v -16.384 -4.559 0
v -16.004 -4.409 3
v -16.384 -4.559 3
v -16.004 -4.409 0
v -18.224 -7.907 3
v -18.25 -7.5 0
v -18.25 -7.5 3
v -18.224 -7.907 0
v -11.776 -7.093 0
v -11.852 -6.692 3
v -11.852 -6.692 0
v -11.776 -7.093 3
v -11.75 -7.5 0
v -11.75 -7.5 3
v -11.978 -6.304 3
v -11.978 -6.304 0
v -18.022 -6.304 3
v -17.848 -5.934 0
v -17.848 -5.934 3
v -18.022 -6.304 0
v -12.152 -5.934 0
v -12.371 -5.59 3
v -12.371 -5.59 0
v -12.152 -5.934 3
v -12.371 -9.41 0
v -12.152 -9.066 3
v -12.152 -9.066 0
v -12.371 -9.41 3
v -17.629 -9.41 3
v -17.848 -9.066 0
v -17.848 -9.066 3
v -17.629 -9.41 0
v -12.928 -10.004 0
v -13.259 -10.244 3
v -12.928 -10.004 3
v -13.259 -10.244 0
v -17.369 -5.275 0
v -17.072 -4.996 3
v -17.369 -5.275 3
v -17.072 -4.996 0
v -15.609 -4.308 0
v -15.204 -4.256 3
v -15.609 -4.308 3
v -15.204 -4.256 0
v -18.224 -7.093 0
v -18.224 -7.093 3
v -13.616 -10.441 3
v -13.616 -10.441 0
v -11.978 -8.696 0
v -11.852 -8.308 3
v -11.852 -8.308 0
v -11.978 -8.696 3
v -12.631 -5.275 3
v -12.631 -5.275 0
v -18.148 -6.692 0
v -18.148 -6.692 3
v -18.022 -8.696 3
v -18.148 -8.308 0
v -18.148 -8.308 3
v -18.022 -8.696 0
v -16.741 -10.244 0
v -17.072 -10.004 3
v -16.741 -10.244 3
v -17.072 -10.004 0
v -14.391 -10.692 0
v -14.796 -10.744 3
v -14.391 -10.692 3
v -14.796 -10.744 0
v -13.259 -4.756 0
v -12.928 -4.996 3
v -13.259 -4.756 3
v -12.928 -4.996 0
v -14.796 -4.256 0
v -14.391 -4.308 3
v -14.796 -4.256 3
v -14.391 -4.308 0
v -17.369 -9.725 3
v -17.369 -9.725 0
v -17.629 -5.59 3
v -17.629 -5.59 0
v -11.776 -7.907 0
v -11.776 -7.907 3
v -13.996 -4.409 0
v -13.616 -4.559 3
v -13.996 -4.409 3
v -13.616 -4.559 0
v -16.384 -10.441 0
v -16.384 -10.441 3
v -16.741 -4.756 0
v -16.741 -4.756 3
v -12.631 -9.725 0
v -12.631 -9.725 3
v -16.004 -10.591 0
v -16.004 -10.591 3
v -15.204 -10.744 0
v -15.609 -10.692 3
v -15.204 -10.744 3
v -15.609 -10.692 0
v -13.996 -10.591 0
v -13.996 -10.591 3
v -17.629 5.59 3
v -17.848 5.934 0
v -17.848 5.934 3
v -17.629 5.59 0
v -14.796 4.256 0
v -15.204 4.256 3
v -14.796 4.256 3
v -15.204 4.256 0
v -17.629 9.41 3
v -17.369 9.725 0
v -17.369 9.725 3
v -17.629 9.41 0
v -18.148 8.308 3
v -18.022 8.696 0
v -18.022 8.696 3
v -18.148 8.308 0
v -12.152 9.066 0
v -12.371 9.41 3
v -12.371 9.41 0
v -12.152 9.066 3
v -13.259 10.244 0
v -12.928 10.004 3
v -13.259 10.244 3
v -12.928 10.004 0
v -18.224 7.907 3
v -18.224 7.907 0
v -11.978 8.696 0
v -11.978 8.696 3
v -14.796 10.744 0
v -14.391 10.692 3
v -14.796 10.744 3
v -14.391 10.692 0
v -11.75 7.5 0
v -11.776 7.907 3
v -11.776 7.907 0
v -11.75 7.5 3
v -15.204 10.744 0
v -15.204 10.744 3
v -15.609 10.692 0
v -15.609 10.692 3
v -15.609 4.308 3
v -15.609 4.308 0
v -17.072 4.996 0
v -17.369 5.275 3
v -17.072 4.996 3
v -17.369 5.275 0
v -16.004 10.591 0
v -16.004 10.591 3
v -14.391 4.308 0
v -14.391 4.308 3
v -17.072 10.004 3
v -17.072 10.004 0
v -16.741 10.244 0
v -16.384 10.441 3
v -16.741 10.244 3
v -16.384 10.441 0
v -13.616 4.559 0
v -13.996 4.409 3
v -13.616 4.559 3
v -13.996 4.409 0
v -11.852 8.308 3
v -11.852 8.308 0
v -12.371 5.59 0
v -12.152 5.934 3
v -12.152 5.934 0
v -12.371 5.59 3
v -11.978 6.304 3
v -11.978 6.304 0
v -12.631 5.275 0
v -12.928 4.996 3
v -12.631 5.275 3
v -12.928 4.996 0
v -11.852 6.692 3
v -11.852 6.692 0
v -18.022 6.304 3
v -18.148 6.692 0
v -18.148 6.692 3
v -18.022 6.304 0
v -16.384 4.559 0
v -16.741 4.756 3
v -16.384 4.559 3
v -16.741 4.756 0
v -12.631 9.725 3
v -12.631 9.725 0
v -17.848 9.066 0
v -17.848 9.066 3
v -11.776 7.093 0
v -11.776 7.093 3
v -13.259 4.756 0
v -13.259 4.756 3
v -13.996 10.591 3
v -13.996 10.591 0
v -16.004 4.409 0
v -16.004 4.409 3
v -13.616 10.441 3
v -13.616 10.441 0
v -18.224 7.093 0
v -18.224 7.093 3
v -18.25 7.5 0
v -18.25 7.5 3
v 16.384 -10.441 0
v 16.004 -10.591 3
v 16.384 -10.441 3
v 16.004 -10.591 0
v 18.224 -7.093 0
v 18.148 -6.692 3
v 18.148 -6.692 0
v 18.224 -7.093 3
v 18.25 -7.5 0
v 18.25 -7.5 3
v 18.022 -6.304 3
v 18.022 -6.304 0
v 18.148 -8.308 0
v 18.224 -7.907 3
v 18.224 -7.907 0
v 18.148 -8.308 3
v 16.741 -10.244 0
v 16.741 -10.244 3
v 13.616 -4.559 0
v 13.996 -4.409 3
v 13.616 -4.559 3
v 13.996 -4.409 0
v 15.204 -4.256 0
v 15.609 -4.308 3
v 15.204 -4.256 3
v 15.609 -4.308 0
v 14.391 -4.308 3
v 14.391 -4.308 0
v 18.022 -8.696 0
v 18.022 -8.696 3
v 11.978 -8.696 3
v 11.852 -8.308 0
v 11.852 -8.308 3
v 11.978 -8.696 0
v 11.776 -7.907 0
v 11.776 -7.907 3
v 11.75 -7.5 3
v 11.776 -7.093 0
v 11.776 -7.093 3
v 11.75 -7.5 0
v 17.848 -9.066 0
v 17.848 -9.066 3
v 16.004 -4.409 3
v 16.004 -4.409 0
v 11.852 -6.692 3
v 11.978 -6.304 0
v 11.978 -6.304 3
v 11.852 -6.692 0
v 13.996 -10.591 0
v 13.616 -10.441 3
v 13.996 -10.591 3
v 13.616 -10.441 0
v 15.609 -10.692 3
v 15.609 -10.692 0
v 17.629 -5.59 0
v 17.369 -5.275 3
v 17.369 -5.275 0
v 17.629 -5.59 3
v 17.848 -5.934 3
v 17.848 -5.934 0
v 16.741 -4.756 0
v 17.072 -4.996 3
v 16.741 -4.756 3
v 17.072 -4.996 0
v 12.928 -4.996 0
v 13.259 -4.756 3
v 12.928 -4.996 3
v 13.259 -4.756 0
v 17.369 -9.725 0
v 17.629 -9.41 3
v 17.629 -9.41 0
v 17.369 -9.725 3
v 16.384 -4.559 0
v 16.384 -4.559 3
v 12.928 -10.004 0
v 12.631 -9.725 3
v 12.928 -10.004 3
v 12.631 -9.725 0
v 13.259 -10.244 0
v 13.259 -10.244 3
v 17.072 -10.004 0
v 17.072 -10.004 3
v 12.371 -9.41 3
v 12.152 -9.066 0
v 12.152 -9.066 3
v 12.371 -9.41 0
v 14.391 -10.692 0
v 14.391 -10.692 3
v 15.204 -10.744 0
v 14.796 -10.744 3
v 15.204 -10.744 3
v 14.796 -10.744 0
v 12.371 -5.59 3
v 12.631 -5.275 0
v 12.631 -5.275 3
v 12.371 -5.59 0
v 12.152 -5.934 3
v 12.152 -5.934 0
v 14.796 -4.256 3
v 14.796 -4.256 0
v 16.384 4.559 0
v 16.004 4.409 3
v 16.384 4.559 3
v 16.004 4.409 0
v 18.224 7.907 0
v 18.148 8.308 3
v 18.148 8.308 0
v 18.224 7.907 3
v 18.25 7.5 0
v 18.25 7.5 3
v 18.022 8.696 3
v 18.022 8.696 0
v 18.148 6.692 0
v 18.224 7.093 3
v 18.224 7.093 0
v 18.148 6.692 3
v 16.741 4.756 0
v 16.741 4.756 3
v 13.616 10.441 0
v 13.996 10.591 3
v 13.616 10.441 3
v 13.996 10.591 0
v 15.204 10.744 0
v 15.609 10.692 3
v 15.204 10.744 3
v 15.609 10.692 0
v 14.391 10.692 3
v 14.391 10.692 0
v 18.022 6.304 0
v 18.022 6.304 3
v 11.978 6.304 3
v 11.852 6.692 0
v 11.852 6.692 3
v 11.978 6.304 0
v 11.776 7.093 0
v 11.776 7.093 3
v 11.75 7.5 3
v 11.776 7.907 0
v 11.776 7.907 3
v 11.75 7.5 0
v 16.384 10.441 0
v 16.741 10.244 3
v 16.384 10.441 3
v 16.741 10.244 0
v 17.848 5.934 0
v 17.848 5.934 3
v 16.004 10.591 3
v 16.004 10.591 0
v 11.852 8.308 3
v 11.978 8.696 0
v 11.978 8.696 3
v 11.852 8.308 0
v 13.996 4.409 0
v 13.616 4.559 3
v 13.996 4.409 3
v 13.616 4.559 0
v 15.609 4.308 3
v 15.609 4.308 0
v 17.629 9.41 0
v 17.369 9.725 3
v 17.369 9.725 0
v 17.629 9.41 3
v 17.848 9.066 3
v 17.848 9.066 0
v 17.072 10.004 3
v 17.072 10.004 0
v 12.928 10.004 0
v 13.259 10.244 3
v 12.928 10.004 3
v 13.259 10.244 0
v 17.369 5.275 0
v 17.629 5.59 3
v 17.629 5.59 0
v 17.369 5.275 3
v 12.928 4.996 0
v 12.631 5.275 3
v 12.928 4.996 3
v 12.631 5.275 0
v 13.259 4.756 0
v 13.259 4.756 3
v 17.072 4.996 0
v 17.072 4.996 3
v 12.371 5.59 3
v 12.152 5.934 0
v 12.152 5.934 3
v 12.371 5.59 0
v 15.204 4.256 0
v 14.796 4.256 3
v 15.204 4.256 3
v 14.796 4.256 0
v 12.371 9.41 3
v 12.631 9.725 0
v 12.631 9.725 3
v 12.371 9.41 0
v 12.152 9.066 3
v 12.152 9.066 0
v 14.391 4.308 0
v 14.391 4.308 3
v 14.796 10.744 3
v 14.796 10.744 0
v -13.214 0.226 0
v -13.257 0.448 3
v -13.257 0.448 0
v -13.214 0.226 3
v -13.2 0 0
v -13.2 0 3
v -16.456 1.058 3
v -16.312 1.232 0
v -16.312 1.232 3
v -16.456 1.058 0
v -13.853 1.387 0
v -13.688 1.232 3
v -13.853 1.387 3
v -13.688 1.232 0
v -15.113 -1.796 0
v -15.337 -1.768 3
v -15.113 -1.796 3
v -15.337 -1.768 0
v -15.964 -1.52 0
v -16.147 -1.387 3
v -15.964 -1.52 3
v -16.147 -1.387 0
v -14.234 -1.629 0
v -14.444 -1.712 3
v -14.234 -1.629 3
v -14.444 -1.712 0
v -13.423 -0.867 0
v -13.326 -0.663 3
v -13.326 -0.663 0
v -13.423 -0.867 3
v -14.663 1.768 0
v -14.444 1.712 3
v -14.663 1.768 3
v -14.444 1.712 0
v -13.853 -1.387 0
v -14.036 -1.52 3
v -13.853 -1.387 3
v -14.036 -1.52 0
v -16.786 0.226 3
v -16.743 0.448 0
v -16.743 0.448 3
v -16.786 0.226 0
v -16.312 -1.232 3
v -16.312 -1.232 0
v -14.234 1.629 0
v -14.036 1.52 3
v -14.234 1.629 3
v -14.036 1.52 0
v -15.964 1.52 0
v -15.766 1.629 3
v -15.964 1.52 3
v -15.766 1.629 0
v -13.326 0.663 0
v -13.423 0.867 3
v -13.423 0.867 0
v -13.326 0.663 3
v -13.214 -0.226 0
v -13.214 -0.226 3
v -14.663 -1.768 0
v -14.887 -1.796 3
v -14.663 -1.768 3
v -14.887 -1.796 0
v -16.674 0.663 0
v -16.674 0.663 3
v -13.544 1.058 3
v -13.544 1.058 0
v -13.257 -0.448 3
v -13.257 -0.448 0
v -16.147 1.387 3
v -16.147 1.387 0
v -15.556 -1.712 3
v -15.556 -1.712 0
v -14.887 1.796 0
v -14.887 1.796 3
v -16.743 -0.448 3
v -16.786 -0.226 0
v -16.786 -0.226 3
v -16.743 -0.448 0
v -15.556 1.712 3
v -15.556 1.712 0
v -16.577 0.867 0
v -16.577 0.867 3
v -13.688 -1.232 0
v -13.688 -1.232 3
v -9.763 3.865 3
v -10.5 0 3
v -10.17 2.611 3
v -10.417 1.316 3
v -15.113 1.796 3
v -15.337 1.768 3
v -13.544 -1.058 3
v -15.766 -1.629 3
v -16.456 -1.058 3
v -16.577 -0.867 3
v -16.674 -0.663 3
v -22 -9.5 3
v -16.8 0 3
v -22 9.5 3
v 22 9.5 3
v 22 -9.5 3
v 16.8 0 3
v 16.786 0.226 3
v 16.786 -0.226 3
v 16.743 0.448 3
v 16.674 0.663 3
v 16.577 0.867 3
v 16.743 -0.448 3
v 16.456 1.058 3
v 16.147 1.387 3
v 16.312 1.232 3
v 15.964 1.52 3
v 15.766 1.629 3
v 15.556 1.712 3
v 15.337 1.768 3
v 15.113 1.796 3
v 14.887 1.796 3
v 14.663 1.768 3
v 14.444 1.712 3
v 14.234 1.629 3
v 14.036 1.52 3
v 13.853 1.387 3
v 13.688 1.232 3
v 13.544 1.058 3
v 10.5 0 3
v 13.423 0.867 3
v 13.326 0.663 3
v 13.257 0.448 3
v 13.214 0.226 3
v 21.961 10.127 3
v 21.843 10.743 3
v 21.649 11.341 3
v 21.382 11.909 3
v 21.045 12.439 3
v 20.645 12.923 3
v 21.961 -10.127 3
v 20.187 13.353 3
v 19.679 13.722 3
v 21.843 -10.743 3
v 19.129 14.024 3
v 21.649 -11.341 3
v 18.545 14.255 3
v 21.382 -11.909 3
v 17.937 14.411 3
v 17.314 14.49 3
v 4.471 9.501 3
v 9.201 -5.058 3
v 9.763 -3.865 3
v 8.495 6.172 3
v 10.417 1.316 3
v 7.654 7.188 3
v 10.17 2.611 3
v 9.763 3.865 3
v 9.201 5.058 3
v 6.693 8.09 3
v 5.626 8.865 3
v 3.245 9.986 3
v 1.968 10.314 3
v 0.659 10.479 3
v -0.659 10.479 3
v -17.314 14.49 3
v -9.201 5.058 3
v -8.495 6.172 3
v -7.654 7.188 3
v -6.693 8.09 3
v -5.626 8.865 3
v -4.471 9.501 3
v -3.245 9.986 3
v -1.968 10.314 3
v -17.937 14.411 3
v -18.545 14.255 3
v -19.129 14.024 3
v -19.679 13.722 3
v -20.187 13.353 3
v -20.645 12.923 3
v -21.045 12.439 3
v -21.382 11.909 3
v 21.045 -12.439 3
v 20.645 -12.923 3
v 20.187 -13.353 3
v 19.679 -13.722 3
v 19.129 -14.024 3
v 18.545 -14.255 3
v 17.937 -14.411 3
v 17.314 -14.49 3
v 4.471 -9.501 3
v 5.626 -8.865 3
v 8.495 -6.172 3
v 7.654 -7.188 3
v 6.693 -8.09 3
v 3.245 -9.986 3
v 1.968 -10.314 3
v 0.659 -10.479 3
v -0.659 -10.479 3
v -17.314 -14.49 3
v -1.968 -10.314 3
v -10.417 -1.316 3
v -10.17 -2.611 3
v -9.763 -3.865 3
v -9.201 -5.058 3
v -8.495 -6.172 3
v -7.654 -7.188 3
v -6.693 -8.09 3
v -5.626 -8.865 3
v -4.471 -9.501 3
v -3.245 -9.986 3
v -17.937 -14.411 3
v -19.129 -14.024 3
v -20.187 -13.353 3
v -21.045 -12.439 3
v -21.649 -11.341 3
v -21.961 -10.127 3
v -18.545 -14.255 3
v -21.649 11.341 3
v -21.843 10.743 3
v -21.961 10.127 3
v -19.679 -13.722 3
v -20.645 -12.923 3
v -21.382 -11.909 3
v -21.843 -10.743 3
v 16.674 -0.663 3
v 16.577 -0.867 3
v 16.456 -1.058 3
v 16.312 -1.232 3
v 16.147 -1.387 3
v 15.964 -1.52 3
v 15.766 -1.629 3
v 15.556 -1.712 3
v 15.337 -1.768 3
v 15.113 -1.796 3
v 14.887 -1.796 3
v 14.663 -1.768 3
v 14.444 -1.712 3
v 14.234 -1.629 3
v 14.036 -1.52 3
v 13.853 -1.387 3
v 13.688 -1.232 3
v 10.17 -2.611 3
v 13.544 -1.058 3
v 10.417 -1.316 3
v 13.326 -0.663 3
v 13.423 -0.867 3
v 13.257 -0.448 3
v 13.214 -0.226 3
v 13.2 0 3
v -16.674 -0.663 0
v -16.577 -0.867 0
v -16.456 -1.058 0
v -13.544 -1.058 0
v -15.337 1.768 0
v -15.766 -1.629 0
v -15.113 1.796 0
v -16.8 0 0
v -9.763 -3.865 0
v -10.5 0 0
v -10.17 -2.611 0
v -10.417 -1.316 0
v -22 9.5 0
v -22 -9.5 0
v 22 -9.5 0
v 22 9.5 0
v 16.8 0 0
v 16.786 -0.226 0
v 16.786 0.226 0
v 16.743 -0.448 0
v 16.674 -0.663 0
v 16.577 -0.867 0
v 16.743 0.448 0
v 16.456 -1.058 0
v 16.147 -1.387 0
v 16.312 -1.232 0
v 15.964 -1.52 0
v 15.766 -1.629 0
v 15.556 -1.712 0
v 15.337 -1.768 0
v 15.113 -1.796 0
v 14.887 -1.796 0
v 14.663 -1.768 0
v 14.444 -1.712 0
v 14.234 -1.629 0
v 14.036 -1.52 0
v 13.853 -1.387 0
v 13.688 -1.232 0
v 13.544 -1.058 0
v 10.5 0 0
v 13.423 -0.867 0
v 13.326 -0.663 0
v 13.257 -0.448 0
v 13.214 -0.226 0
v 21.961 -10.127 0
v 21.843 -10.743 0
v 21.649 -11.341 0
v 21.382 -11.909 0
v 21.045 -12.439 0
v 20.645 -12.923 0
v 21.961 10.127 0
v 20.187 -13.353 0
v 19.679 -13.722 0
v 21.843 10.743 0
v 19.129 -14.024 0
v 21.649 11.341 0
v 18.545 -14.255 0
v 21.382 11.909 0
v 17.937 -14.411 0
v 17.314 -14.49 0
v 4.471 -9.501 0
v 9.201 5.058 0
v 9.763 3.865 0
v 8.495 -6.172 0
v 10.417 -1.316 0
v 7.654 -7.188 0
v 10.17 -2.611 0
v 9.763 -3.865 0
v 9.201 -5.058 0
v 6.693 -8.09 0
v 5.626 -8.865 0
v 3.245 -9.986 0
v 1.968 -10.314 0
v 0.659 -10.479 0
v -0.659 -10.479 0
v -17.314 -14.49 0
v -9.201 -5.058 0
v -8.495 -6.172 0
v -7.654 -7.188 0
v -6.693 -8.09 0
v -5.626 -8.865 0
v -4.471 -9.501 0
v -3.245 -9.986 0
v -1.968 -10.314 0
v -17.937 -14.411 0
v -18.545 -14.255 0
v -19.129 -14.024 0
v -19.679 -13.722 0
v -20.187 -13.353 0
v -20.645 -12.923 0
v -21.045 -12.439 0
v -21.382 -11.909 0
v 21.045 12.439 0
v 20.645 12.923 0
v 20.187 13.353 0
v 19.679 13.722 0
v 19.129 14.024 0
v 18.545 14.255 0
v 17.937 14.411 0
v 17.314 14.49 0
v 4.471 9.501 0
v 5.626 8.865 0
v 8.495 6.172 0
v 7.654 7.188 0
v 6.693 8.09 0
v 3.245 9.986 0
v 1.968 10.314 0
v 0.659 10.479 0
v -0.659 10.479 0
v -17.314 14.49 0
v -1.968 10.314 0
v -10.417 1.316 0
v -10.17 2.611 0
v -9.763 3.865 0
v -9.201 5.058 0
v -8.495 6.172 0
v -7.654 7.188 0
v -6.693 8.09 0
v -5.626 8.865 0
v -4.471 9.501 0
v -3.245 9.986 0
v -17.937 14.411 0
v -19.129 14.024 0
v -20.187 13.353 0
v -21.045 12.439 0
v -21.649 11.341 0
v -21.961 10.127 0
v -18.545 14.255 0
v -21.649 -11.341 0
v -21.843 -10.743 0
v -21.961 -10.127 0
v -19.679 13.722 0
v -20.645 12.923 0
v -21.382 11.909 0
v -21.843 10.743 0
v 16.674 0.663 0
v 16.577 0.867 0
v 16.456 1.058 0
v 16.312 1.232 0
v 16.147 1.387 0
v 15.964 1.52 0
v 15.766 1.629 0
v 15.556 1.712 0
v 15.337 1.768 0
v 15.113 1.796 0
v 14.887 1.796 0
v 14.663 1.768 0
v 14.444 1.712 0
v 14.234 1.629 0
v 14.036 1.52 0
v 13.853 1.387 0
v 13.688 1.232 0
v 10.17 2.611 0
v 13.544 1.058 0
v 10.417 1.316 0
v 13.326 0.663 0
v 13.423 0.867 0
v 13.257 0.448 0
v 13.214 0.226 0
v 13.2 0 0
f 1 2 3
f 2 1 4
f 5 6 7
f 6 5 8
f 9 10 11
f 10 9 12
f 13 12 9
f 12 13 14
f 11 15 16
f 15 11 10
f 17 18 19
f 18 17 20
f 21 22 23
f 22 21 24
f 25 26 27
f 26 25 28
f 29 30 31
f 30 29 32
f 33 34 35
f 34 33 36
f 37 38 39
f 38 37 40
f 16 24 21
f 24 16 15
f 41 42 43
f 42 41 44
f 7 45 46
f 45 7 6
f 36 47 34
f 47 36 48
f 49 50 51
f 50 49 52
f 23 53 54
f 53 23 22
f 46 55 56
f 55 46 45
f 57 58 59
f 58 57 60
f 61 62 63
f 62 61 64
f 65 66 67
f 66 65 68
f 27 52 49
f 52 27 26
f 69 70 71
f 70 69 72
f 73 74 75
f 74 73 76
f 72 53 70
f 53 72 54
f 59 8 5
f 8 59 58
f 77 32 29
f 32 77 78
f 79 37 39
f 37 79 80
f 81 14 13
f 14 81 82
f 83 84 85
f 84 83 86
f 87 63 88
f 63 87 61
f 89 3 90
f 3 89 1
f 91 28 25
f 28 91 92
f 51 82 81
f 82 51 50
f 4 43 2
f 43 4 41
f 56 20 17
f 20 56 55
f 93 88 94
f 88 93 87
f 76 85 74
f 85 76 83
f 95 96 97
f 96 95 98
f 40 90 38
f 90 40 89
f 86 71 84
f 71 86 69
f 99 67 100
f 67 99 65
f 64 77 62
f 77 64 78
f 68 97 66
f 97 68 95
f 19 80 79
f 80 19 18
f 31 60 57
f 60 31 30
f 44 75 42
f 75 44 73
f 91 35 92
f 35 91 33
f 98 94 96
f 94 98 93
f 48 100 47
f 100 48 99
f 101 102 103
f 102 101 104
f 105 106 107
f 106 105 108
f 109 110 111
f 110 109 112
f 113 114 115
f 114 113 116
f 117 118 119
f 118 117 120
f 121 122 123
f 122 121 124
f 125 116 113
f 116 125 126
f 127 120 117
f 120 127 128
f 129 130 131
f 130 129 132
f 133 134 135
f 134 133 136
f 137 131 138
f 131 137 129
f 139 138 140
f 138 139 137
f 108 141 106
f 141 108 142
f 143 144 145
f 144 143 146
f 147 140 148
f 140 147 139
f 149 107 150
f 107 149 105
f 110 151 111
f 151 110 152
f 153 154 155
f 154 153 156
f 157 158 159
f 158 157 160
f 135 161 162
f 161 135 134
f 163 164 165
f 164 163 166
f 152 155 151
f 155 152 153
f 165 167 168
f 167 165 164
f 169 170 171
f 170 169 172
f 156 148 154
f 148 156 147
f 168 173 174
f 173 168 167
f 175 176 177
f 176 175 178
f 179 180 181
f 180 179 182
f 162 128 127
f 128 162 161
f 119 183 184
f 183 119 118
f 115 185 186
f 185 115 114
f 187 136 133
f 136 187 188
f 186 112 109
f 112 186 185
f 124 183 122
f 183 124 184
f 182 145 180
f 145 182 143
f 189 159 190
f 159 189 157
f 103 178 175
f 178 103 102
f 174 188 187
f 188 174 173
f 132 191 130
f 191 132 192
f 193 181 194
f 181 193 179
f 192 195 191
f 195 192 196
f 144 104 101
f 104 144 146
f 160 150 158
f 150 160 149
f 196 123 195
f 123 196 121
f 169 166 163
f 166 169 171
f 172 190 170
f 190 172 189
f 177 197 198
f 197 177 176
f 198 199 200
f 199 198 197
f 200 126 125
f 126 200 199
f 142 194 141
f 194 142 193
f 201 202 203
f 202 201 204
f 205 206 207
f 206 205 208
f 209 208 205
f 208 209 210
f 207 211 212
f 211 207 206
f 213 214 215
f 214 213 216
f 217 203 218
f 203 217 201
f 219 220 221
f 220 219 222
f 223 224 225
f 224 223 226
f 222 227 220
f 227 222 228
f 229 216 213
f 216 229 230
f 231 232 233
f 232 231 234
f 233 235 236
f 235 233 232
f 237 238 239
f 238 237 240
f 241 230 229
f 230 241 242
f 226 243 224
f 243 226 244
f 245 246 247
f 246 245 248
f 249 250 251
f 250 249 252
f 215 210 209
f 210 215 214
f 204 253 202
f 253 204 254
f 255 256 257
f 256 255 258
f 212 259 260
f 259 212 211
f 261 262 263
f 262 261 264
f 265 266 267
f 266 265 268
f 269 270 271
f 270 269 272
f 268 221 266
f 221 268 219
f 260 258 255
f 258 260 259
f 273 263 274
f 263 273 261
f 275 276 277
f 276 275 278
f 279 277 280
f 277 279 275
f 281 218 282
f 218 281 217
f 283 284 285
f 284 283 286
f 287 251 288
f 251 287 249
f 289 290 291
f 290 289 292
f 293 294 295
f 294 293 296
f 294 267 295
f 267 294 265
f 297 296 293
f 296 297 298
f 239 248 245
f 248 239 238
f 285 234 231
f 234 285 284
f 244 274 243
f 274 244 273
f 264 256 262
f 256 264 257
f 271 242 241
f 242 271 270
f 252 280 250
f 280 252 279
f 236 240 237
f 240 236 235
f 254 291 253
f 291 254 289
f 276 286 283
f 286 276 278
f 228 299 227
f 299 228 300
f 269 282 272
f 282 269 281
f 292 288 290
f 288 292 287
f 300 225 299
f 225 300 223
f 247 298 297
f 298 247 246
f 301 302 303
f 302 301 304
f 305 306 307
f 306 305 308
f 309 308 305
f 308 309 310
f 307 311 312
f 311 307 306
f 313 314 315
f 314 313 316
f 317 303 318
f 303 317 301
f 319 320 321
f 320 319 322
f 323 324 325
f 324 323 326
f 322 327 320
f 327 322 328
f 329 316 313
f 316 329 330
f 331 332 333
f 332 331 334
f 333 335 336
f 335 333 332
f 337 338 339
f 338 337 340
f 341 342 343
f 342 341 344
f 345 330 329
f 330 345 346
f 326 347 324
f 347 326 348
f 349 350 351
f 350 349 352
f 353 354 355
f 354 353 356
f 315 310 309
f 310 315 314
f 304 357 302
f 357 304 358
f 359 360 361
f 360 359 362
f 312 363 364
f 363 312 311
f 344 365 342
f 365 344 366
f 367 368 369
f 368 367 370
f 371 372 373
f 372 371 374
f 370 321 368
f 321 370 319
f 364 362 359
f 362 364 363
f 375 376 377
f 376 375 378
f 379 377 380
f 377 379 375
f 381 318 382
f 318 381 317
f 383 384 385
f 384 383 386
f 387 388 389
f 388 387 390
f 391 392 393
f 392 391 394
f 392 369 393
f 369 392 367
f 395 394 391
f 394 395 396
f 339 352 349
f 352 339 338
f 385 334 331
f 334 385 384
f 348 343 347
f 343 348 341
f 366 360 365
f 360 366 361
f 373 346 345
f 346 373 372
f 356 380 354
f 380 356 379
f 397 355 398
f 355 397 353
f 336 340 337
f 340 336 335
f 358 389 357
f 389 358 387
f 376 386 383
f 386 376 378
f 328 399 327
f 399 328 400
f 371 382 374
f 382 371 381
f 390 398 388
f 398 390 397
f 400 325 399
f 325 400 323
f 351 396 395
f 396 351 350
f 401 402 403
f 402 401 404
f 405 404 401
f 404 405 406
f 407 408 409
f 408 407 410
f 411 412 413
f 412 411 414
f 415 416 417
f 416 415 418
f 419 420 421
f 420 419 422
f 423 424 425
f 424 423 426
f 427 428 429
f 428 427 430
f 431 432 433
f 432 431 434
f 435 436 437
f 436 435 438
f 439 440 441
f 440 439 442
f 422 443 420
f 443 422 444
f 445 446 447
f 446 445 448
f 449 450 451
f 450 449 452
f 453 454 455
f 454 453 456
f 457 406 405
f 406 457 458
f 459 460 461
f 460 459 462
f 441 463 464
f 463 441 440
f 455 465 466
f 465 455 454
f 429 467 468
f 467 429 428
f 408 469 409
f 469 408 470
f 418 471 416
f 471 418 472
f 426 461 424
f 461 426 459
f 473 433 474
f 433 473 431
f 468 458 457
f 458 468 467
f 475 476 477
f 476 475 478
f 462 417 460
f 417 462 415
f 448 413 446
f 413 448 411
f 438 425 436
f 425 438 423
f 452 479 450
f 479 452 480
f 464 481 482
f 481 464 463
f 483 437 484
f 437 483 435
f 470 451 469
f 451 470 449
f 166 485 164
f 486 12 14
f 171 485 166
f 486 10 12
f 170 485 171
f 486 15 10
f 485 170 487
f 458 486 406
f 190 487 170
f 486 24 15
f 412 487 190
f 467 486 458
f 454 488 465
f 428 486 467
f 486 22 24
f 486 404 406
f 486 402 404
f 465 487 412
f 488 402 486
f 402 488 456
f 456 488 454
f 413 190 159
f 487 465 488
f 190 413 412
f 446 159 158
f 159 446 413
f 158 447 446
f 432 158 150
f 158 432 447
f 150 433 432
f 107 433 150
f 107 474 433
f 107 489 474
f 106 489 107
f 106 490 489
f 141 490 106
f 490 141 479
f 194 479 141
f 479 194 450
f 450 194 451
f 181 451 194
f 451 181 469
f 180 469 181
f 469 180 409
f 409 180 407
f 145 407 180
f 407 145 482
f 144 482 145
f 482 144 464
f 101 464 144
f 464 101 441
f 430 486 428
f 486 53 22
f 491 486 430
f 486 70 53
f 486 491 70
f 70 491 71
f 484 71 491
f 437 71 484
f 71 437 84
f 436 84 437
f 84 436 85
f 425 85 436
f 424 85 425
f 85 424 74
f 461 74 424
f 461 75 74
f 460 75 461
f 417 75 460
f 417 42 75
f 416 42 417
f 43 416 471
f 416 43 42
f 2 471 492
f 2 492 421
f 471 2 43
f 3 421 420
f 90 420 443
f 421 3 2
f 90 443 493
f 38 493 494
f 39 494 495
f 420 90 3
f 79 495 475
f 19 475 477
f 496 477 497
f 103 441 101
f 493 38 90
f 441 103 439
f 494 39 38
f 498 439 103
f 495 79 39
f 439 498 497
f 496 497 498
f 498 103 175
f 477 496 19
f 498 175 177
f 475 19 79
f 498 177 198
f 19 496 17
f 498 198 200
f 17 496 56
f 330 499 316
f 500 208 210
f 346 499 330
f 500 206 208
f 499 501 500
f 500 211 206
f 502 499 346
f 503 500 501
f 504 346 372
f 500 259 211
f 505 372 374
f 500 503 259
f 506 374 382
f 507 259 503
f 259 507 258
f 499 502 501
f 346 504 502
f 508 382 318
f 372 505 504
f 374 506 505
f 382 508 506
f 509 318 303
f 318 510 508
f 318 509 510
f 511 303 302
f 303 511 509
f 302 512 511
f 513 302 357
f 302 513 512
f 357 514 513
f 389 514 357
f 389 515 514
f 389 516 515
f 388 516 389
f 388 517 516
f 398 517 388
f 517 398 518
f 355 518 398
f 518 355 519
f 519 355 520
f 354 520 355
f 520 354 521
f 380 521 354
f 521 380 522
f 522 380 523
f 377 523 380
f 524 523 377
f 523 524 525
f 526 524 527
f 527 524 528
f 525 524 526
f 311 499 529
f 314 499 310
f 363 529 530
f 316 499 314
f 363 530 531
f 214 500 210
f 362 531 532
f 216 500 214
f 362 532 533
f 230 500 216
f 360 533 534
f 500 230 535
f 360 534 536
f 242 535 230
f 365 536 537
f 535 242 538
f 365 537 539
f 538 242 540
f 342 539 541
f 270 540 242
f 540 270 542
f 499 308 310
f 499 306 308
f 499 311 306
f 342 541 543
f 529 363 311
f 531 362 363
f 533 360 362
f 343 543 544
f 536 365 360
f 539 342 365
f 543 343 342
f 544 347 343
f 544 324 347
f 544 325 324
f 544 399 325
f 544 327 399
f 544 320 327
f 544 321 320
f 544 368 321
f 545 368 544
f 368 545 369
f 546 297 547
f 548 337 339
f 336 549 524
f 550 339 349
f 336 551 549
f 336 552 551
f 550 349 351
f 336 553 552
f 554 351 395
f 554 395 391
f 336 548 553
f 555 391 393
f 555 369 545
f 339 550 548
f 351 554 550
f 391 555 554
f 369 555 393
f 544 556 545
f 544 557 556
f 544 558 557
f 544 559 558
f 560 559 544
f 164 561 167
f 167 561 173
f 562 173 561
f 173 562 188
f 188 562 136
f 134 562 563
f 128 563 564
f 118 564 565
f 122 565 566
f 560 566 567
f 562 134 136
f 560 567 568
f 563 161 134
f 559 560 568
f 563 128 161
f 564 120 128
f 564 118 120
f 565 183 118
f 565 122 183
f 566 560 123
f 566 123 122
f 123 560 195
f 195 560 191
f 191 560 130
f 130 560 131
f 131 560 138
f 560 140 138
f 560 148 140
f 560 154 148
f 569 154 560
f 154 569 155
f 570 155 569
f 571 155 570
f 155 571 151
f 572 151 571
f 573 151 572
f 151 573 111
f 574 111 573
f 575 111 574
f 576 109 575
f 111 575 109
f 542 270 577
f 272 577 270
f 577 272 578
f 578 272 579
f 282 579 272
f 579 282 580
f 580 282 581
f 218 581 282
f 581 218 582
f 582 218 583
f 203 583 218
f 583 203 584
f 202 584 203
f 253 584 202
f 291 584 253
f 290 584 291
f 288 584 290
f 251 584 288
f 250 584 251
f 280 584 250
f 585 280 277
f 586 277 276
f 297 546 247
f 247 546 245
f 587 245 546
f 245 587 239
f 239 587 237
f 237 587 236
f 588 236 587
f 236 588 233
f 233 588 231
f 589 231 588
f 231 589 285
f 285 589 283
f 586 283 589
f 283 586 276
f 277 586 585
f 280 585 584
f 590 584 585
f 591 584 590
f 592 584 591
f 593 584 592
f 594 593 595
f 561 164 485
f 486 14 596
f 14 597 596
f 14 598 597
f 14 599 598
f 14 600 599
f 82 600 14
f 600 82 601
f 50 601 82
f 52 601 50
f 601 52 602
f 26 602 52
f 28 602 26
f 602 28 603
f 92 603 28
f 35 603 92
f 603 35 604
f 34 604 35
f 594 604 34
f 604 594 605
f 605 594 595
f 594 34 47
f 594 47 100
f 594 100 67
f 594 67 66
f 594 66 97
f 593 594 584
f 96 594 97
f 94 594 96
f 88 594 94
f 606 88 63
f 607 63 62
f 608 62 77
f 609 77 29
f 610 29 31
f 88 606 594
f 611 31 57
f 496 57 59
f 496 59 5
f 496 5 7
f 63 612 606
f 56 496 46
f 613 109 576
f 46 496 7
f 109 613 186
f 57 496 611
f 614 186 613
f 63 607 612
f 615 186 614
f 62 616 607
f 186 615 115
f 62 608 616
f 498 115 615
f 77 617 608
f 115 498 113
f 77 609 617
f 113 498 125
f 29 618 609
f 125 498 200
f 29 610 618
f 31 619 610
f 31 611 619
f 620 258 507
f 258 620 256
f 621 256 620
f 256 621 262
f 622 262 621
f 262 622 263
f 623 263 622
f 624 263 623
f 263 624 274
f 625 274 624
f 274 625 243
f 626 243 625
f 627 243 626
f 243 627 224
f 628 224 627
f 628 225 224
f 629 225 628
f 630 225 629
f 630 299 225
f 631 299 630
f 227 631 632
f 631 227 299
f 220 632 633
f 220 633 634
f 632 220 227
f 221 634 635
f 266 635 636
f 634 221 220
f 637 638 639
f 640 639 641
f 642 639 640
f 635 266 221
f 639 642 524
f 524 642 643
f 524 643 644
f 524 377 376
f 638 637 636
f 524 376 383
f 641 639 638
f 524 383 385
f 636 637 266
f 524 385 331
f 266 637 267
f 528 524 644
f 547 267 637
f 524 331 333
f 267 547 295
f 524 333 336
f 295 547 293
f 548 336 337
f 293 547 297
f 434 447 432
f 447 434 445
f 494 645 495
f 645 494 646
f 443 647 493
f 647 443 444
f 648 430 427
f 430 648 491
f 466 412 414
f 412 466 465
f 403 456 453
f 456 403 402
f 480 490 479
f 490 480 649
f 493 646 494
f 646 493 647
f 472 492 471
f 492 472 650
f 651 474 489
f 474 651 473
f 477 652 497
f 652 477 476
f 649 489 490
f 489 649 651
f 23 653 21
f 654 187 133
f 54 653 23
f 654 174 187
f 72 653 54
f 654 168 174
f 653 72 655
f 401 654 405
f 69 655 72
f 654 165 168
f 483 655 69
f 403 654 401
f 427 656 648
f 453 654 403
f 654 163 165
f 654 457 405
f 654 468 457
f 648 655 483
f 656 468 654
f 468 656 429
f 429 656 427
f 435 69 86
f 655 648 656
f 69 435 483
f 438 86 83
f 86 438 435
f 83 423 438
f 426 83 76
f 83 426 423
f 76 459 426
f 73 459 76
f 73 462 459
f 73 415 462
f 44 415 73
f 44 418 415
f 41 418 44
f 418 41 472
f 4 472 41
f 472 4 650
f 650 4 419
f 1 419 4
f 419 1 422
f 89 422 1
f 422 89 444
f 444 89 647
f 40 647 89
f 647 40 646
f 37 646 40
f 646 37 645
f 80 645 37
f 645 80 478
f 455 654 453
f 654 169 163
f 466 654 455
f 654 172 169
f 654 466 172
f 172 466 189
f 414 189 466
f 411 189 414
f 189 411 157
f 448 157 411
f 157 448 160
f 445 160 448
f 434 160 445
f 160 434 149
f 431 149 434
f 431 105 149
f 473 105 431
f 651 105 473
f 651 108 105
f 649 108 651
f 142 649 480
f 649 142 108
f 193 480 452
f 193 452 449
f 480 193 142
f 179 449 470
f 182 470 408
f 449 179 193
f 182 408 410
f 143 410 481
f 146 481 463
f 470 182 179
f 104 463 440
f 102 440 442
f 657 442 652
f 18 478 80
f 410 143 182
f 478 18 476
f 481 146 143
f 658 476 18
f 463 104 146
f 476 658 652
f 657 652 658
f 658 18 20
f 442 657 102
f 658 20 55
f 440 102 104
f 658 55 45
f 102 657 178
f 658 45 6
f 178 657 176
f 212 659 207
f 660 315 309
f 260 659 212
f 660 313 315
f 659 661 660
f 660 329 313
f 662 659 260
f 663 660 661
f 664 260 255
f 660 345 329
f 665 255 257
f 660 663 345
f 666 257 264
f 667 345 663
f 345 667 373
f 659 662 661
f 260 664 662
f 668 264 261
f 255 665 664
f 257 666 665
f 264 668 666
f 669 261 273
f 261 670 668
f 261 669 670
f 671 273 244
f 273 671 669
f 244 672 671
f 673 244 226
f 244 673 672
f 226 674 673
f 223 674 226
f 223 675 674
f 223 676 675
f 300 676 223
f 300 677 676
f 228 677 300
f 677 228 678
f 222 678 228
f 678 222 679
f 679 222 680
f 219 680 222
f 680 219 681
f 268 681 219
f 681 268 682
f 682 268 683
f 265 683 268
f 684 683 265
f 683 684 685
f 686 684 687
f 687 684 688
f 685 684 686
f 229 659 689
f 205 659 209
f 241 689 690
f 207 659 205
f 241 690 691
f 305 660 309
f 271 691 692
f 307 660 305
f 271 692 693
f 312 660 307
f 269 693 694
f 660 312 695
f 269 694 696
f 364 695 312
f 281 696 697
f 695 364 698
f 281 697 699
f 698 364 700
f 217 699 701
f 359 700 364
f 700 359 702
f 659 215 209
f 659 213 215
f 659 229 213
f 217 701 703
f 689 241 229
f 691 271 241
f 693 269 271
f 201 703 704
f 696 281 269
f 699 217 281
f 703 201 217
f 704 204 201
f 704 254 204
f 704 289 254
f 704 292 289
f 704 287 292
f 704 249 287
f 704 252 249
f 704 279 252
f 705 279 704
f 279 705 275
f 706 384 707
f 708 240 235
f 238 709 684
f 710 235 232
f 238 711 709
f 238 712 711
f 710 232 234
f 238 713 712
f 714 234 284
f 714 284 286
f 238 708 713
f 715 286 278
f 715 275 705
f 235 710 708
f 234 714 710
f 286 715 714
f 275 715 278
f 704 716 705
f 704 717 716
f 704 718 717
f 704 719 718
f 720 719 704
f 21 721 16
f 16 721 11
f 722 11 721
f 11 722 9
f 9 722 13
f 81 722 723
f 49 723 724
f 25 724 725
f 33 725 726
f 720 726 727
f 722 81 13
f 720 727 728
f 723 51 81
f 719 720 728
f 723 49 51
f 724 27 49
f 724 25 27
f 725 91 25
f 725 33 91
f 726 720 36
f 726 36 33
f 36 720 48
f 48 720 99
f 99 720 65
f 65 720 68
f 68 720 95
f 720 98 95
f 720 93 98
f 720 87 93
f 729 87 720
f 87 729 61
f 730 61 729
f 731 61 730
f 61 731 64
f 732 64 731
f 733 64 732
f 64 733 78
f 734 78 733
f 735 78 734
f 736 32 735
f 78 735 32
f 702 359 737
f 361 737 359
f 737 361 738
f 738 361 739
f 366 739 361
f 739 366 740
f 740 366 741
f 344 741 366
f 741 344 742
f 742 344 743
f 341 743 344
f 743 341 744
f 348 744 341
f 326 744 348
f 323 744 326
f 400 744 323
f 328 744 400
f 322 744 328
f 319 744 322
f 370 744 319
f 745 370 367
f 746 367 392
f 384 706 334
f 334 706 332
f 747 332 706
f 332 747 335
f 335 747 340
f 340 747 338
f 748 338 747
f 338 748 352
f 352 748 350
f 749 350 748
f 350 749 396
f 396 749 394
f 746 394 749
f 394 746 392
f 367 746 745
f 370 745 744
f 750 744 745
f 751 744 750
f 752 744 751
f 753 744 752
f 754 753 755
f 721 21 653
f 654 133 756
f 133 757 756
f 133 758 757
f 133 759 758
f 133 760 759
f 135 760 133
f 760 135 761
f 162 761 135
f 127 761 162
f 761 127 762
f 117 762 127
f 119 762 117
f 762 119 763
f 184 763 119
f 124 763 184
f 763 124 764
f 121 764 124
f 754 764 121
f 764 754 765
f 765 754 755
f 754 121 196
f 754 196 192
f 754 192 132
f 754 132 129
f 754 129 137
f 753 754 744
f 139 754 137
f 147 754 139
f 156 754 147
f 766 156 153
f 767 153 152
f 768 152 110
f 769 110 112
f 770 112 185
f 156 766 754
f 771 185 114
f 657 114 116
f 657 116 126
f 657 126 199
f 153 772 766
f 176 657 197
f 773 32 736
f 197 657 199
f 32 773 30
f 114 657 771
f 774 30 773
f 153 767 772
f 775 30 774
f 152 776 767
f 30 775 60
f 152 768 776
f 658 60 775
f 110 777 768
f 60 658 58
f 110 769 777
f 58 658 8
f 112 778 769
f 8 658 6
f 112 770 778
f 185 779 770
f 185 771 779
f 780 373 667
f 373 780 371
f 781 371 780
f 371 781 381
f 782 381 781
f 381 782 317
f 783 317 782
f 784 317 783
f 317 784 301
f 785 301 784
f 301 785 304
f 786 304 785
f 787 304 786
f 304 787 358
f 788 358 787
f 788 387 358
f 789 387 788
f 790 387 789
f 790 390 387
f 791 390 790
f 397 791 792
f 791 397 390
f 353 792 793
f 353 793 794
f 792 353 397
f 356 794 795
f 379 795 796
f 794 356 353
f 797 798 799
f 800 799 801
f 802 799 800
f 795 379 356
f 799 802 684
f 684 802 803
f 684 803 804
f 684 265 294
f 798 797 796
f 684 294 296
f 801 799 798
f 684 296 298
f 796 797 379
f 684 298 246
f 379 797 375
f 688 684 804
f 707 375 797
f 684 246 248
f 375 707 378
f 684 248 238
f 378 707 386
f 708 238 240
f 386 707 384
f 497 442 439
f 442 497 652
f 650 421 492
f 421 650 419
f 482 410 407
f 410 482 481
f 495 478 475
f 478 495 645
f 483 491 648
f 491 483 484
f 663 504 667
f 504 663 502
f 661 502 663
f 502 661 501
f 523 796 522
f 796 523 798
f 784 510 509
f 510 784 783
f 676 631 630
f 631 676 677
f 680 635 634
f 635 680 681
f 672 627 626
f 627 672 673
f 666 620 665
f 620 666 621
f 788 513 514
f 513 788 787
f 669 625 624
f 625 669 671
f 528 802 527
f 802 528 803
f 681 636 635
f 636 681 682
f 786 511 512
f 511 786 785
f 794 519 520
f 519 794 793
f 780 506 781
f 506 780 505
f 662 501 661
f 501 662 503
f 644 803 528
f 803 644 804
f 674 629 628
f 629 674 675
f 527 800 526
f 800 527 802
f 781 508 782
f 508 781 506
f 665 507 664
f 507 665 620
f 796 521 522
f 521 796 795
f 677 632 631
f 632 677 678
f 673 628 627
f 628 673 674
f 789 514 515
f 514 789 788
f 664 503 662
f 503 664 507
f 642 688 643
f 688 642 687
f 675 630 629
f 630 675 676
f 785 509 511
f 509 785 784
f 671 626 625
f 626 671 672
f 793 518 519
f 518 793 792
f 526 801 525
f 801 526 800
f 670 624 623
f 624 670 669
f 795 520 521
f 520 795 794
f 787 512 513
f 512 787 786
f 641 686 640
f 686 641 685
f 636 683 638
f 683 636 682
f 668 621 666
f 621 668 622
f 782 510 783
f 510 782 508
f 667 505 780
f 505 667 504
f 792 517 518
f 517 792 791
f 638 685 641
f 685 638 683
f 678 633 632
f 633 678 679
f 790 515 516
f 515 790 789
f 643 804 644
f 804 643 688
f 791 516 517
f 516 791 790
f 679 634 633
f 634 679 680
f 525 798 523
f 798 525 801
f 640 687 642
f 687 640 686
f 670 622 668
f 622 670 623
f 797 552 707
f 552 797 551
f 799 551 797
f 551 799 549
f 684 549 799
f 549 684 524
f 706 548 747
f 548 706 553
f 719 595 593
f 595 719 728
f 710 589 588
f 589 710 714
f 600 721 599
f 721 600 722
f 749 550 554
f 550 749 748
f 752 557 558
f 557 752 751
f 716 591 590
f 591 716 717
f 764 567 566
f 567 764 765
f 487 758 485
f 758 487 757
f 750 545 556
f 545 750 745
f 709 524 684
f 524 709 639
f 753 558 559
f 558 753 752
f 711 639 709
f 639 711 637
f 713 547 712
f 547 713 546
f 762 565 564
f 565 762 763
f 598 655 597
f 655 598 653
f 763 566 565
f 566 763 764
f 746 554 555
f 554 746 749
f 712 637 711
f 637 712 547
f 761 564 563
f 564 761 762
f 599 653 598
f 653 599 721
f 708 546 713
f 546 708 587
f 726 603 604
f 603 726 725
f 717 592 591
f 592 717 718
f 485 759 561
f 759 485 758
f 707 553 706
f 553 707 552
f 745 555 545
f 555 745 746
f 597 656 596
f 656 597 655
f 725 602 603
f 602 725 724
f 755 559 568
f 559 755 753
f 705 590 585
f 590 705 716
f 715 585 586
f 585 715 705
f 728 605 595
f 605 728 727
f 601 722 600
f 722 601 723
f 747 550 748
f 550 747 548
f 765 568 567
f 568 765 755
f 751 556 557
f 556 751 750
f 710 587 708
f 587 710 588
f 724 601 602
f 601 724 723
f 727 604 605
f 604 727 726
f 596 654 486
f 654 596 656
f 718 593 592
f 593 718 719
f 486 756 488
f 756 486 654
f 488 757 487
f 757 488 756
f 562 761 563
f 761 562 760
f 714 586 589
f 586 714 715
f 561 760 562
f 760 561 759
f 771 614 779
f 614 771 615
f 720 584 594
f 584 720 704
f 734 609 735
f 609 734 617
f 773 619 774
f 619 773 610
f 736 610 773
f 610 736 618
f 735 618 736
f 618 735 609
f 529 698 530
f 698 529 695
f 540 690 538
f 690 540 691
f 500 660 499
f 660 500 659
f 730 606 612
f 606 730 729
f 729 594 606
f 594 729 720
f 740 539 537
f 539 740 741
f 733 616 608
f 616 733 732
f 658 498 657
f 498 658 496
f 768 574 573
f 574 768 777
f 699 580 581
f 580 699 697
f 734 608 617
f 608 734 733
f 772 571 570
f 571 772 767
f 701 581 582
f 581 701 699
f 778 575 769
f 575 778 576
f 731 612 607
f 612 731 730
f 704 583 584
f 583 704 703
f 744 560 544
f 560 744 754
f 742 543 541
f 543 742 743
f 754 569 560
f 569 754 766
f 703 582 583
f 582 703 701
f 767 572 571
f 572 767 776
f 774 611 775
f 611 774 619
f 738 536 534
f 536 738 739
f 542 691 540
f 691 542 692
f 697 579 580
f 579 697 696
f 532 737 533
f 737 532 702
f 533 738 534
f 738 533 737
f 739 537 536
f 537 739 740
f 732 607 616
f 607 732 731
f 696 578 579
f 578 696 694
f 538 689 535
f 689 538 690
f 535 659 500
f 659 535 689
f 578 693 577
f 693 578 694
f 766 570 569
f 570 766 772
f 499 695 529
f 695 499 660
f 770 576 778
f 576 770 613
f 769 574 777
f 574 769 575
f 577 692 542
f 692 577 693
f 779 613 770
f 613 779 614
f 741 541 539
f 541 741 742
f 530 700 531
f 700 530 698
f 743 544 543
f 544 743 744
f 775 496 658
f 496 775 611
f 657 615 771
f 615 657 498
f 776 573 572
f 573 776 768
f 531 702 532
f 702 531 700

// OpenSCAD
$fn = 50;


difference() {
	union() {
		hull() {
			translate(v = [-17.0000000000, 9.5000000000, 0]) {
				cylinder(h = 3, r = 5);
			}
			translate(v = [17.0000000000, 9.5000000000, 0]) {
				cylinder(h = 3, r = 5);
			}
			translate(v = [-17.0000000000, -9.5000000000, 0]) {
				cylinder(h = 3, r = 5);
			}
			translate(v = [17.0000000000, -9.5000000000, 0]) {
				cylinder(h = 3, r = 5);
			}
		}
	}
	union() {
		#translate(v = [-15.0000000000, -7.5000000000, 0]) {
			cylinder(h = 3, r = 3.2500000000);
		}
		#translate(v = [-15.0000000000, 7.5000000000, 0]) {
			cylinder(h = 3, r = 3.2500000000);
		}
		#translate(v = [15.0000000000, -7.5000000000, 0]) {
			cylinder(h = 3, r = 3.2500000000);
		}
		#translate(v = [15.0000000000, 7.5000000000, 0]) {
			cylinder(h = 3, r = 3.2500000000);
		}
		#translate(v = [-15.0000000000, -7.5000000000, -100.0000000000]) {
			cylinder(h = 200, r = 3.2500000000);
		}
		#translate(v = [-15.0000000000, 7.5000000000, -100.0000000000]) {
			cylinder(h = 200, r = 3.2500000000);
		}
		#translate(v = [15.0000000000, -7.5000000000, -100.0000000000]) {
			cylinder(h = 200, r = 3.2500000000);
		}
		#translate(v = [15.0000000000, 7.5000000000, -100.0000000000]) {
			cylinder(h = 200, r = 3.2500000000);
		}
		#translate(v = [-15.0000000000, -7.5000000000, 0]) {
			cylinder(h = 3, r = 1.8000000000);
		}
		#translate(v = [-15.0000000000, 0.0000000000, 0]) {
			cylinder(h = 3, r = 1.8000000000);
		}
		#translate(v = [-15.0000000000, 7.5000000000, 0]) {
			cylinder(h = 3, r = 1.8000000000);
		}
		#translate(v = [15.0000000000, -7.5000000000, 0]) {
			cylinder(h = 3, r = 1.8000000000);
		}
		#translate(v = [15.0000000000, 0.0000000000, 0]) {
			cylinder(h = 3, r = 1.8000000000);
		}
		#translate(v = [15.0000000000, 7.5000000000, 0]) {
			cylinder(h = 3, r = 1.8000000000);
		}
		#translate(v = [-15.0000000000, -7.5000000000, 0]) {
			cylinder(h = 3, r = 1.8000000000);
		}
		#translate(v = [-15.0000000000, 0.0000000000, 0]) {
			cylinder(h = 3, r = 1.8000000000);
		}
		#translate(v = [-15.0000000000, 7.5000000000, 0]) {
			cylinder(h = 3, r = 1.8000000000);
		}
		#translate(v = [15.0000000000, -7.5000000000, 0]) {
			cylinder(h = 3, r = 1.8000000000);
		}
		#translate(v = [15.0000000000, 0.0000000000, 0]) {
			cylinder(h = 3, r = 1.8000000000);
		}
		#translate(v = [15.0000000000, 7.5000000000, 0]) {
			cylinder(h = 3, r = 1.8000000000);
		}
		#translate(v = [-15.0000000000, -7.5000000000, 0]) {
			cylinder(h = 3, r = 1.8000000000);
		}
		#translate(v = [-15.0000000000, 0.0000000000, 0]) {
			cylinder(h = 3, r = 1.8000000000);
		}
		#translate(v = [-15.0000000000, 7.5000000000, 0]) {
			cylinder(h = 3, r = 1.8000000000);
		}
		#translate(v = [15.0000000000, -7.5000000000, 0]) {
			cylinder(h = 3, r = 1.8000000000);
		}
		#translate(v = [15.0000000000, 0.0000000000, 0]) {
			cylinder(h = 3, r = 1.8000000000);
		}
		#translate(v = [15.0000000000, 7.5000000000, 0]) {
			cylinder(h = 3, r = 1.8000000000);
		}
		#cylinder(h = 3, r = 10.5000000000);
	}
}
